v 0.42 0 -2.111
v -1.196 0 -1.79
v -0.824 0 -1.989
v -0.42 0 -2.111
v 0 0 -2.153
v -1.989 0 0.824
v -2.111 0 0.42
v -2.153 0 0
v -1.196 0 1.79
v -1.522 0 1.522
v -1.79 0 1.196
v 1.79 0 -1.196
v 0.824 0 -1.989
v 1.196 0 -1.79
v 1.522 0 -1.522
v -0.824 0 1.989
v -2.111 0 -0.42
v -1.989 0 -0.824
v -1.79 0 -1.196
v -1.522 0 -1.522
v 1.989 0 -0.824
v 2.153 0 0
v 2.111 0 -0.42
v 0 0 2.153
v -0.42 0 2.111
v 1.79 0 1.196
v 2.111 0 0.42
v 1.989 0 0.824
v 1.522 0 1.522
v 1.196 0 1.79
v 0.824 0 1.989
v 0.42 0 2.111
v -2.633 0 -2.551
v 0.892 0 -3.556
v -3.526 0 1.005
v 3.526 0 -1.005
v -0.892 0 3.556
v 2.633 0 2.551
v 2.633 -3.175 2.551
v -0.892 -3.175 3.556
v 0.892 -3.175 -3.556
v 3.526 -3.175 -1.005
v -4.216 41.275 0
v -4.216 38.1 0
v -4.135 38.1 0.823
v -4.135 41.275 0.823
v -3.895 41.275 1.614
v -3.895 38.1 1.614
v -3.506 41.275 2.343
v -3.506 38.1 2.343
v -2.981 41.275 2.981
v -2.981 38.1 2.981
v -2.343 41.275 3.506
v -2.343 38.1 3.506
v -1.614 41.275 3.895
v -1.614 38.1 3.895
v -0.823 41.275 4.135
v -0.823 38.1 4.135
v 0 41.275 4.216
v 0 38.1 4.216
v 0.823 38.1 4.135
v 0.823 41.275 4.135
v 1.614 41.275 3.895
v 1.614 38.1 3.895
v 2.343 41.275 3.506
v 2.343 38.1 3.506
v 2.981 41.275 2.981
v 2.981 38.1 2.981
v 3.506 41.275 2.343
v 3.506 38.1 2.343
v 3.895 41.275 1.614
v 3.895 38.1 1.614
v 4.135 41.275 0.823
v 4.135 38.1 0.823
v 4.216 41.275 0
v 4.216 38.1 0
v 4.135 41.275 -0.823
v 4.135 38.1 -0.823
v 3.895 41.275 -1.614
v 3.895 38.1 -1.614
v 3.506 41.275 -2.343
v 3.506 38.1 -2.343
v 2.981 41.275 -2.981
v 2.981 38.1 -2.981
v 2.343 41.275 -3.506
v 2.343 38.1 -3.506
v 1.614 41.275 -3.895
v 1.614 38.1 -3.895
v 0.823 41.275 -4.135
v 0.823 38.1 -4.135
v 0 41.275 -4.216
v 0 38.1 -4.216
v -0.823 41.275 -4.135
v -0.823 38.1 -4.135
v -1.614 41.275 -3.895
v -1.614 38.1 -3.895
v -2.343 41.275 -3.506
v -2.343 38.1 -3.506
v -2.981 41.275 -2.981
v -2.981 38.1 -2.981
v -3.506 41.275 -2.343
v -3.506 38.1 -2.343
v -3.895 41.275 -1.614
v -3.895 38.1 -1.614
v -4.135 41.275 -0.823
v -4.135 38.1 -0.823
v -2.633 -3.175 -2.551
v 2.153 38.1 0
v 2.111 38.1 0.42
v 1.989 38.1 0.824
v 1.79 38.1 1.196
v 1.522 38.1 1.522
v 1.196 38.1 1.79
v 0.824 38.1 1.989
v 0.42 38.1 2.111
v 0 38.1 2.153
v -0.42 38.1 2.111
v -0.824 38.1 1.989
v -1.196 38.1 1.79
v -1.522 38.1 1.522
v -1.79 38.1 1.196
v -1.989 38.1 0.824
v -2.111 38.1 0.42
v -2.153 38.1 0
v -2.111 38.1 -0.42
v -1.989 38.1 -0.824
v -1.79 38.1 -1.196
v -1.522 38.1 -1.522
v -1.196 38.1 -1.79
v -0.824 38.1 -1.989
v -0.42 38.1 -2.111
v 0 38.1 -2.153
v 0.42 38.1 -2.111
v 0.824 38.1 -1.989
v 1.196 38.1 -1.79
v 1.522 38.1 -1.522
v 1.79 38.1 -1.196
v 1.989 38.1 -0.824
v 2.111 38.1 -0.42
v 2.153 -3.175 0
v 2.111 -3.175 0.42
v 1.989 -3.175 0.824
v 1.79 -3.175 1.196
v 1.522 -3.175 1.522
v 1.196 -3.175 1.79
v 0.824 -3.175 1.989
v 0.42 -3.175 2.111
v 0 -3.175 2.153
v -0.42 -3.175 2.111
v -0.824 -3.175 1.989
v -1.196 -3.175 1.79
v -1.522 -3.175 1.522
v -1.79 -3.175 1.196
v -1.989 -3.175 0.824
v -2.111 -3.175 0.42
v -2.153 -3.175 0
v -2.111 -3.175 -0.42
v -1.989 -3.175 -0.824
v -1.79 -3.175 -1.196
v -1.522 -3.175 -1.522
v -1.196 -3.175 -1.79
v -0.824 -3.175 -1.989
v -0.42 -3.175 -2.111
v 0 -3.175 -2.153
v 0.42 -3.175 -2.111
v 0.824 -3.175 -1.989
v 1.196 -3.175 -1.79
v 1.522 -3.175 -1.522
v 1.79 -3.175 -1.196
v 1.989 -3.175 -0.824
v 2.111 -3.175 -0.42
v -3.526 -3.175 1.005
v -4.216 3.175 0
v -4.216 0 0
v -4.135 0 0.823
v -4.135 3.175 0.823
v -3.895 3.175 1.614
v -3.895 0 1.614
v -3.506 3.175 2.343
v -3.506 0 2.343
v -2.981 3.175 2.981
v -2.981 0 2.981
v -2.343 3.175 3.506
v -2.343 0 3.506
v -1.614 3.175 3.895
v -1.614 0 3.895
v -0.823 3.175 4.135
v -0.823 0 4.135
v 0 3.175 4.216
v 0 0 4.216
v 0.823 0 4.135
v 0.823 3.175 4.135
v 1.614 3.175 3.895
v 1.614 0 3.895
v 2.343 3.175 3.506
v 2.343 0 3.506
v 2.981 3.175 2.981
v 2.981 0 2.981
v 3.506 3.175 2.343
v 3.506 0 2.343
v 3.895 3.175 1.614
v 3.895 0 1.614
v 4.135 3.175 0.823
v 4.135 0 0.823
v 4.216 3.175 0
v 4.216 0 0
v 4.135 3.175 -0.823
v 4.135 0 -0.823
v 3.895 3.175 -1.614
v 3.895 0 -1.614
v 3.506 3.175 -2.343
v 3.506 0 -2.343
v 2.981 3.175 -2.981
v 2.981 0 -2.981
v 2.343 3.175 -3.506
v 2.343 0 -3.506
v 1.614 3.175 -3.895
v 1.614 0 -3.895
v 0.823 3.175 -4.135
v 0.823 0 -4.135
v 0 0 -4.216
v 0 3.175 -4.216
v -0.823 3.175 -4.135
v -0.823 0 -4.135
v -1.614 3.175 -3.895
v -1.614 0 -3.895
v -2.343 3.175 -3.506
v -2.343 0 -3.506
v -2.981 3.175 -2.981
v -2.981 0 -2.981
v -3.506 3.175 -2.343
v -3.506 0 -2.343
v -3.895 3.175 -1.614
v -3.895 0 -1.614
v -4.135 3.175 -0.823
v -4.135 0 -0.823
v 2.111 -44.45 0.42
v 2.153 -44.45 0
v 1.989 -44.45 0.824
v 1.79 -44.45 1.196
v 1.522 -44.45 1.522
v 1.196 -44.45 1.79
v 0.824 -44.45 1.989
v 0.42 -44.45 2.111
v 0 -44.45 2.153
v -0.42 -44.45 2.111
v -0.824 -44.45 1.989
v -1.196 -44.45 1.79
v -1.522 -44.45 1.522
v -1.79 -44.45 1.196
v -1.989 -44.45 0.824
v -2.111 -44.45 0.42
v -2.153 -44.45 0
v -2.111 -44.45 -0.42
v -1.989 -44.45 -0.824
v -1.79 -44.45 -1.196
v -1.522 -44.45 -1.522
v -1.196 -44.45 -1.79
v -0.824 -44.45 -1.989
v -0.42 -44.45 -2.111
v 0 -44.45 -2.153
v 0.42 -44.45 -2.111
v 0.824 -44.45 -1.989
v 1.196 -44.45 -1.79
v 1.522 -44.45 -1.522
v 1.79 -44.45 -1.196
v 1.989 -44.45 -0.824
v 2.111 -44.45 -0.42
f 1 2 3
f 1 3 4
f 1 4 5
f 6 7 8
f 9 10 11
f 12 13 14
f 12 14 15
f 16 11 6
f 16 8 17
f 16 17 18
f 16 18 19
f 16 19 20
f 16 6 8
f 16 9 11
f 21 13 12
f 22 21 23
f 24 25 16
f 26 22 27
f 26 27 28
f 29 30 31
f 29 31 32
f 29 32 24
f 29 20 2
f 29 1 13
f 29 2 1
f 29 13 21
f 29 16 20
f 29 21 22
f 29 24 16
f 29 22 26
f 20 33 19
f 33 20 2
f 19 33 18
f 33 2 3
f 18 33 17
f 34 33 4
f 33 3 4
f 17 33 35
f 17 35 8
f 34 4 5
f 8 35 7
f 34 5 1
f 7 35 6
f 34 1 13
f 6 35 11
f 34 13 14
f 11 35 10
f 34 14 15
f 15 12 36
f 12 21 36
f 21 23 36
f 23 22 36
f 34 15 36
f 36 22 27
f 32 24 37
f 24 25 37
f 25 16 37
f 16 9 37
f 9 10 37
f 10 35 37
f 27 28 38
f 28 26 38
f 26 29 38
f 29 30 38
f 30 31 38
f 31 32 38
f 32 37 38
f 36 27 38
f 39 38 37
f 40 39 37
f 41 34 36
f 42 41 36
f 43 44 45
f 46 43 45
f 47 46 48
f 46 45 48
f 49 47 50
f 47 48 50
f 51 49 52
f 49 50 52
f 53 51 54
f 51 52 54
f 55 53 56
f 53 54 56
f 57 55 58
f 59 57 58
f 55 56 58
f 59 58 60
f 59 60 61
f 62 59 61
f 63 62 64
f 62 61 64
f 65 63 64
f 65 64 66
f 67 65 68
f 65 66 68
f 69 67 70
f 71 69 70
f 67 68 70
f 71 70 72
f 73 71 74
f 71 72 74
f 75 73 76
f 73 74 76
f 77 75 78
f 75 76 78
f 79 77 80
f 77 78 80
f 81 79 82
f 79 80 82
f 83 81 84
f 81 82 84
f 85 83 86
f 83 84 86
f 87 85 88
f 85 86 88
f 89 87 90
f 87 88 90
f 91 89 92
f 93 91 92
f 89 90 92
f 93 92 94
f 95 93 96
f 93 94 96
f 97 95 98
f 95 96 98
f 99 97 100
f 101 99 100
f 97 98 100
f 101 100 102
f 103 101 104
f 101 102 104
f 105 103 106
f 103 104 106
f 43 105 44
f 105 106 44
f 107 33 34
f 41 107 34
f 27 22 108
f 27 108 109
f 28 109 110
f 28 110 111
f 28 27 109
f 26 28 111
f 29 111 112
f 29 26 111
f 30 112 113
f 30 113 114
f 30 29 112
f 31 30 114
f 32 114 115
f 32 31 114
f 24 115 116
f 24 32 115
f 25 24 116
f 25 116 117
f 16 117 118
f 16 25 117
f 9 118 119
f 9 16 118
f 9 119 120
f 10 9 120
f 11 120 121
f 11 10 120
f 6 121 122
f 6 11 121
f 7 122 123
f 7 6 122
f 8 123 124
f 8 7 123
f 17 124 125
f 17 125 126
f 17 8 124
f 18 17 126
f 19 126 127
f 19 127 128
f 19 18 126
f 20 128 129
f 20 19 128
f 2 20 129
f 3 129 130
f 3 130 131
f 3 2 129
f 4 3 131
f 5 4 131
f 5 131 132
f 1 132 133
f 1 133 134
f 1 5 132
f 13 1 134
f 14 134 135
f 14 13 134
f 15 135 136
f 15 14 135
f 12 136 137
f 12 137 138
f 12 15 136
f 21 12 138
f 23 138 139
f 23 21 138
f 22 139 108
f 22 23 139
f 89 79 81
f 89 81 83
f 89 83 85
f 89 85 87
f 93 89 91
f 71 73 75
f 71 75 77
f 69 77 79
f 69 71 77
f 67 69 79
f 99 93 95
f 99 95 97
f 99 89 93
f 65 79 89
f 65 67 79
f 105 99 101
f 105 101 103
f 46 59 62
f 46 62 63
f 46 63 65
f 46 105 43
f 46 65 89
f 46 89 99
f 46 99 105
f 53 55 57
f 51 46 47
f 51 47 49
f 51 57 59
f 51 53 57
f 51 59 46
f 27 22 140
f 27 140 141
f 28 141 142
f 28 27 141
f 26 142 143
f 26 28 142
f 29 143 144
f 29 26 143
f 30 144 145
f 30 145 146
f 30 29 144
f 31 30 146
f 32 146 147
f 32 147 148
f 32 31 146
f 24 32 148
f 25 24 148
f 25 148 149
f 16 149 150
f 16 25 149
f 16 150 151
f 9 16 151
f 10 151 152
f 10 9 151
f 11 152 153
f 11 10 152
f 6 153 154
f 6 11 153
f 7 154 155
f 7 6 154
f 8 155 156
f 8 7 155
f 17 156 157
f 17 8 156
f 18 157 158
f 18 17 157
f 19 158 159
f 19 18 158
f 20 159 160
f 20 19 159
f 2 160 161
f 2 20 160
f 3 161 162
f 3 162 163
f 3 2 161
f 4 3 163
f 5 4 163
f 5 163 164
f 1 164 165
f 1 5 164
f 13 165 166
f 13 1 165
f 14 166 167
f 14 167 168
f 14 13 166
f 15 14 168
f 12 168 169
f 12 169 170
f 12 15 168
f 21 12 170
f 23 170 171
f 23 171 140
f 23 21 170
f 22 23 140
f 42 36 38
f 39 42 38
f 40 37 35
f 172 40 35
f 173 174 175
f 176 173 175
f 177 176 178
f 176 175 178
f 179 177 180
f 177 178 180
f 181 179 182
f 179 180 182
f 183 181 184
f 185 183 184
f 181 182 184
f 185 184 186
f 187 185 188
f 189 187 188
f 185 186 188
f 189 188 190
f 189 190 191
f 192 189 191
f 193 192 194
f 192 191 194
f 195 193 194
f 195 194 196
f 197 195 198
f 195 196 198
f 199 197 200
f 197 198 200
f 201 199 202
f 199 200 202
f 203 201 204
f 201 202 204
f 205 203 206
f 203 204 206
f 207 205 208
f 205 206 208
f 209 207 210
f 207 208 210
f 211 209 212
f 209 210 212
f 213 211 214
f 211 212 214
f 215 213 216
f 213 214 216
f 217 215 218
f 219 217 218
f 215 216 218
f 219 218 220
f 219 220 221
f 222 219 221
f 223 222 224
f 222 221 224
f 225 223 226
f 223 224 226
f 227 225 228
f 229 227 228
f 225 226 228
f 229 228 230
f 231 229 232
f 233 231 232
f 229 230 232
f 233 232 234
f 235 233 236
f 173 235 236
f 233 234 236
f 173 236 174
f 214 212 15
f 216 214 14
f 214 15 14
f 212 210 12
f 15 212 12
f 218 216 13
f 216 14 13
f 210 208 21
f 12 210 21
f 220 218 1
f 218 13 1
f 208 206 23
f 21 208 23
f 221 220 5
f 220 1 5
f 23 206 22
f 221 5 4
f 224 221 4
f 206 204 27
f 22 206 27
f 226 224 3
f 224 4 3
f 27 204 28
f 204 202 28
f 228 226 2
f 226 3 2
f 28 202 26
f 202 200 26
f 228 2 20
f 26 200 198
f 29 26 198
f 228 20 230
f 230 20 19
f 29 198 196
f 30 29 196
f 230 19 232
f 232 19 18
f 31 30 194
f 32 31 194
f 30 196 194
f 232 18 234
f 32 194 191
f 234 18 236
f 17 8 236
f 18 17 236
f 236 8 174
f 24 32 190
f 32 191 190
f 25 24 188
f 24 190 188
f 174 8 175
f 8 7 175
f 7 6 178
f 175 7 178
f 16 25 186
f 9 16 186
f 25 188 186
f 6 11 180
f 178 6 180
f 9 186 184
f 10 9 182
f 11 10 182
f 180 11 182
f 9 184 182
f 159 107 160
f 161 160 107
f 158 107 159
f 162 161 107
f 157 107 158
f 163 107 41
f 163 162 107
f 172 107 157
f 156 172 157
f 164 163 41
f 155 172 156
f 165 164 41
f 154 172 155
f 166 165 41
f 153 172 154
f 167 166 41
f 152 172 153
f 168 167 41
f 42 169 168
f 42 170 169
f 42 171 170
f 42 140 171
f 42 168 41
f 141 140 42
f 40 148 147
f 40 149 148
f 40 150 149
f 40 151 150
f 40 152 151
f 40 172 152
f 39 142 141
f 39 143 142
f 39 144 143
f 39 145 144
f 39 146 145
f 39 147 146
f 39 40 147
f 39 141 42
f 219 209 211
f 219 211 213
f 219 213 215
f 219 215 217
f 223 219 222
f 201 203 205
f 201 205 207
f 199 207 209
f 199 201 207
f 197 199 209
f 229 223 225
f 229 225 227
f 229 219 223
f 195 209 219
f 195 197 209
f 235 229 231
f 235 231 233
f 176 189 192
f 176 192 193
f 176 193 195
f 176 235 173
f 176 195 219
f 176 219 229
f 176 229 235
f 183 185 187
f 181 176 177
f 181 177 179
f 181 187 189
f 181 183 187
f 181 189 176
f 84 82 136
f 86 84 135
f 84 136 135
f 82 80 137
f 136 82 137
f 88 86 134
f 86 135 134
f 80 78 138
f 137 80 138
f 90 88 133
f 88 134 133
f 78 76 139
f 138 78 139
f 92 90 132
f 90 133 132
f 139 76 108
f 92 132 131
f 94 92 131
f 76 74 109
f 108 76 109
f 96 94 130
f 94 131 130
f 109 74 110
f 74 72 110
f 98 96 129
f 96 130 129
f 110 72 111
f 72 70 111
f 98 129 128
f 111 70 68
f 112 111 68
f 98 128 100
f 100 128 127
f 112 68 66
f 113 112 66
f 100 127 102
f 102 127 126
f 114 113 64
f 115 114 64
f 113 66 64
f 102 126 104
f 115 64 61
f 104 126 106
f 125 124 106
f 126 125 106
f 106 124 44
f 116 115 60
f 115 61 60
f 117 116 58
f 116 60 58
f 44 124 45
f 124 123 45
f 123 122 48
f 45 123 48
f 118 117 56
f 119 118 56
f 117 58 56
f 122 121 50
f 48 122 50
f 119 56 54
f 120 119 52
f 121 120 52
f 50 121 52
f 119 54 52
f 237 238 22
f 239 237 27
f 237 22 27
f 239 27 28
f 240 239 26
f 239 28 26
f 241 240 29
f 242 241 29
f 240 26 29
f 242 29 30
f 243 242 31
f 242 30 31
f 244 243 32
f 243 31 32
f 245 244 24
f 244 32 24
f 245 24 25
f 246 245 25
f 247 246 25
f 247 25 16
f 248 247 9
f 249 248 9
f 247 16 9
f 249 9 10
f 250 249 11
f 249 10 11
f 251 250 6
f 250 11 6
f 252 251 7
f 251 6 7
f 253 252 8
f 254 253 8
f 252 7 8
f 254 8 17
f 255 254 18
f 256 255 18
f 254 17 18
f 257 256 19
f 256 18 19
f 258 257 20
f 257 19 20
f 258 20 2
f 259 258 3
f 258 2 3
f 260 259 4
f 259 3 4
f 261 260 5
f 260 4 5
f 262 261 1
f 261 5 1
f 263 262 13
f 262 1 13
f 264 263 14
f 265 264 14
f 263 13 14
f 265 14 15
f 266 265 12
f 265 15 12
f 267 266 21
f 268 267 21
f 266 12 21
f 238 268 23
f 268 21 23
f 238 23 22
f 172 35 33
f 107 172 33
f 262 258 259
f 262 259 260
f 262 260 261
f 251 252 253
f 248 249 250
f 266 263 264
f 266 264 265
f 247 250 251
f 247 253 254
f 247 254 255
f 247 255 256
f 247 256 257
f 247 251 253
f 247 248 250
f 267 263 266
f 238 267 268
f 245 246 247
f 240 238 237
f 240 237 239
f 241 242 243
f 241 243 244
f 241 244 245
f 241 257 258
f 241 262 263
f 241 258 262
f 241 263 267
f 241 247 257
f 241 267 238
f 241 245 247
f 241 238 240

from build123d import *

# Parameters (mm, degrees)
F0_R     = 2.15265
F1_DEPTH = 44.45
F2_R     = 4.2164
F3_DEPTH = 3.175
F4_R     = 2.15265
F5_DEPTH = 3.175
F6_R     = 2.15265
F7_DEPTH = 38.1
F8_R     = 4.2164
F9_DEPTH = 3.175


with BuildPart() as f1:
    # F0 (on Front) → F1 (new body)
    with BuildSketch(Plane.XZ):
        Circle(F0_R)
    extrude(amount=F1_DEPTH)

    # F2 (on face) → F3 (join)
    with BuildSketch(Plane(origin=(0, 0, 0), x_dir=(-1, 0, 0), z_dir=(0, 1, 0))):
        Circle(F2_R)
    extrude(amount=F3_DEPTH)


with BuildPart() as f5:
    # F4 (on Front) → F5 (new body)
    with BuildSketch(Plane.XZ):
        Polygon((0.892242, -3.555944), (3.525659, -1.005268), (2.633417, 2.550676), (-0.892242, 3.555944), (-3.525659, 1.005268), (-2.633417, -2.550676), align=None)
        Circle(F4_R, mode=Mode.SUBTRACT)
    extrude(amount=F5_DEPTH)


with BuildPart() as f7:
    # F6 (on Front) → F7 (new body)
    with BuildSketch(Plane.XZ):
        Circle(F6_R)
    extrude(amount=-F7_DEPTH)

    # F8 (on face) → F9 (join)
    with BuildSketch(Plane(origin=(0, 38.1, 0), x_dir=(-1, 0, 0), z_dir=(0, 1, 0))):
        Circle(F8_R)
    extrude(amount=F9_DEPTH)


solid = Compound([f1.part, f5.part, f7.part])
